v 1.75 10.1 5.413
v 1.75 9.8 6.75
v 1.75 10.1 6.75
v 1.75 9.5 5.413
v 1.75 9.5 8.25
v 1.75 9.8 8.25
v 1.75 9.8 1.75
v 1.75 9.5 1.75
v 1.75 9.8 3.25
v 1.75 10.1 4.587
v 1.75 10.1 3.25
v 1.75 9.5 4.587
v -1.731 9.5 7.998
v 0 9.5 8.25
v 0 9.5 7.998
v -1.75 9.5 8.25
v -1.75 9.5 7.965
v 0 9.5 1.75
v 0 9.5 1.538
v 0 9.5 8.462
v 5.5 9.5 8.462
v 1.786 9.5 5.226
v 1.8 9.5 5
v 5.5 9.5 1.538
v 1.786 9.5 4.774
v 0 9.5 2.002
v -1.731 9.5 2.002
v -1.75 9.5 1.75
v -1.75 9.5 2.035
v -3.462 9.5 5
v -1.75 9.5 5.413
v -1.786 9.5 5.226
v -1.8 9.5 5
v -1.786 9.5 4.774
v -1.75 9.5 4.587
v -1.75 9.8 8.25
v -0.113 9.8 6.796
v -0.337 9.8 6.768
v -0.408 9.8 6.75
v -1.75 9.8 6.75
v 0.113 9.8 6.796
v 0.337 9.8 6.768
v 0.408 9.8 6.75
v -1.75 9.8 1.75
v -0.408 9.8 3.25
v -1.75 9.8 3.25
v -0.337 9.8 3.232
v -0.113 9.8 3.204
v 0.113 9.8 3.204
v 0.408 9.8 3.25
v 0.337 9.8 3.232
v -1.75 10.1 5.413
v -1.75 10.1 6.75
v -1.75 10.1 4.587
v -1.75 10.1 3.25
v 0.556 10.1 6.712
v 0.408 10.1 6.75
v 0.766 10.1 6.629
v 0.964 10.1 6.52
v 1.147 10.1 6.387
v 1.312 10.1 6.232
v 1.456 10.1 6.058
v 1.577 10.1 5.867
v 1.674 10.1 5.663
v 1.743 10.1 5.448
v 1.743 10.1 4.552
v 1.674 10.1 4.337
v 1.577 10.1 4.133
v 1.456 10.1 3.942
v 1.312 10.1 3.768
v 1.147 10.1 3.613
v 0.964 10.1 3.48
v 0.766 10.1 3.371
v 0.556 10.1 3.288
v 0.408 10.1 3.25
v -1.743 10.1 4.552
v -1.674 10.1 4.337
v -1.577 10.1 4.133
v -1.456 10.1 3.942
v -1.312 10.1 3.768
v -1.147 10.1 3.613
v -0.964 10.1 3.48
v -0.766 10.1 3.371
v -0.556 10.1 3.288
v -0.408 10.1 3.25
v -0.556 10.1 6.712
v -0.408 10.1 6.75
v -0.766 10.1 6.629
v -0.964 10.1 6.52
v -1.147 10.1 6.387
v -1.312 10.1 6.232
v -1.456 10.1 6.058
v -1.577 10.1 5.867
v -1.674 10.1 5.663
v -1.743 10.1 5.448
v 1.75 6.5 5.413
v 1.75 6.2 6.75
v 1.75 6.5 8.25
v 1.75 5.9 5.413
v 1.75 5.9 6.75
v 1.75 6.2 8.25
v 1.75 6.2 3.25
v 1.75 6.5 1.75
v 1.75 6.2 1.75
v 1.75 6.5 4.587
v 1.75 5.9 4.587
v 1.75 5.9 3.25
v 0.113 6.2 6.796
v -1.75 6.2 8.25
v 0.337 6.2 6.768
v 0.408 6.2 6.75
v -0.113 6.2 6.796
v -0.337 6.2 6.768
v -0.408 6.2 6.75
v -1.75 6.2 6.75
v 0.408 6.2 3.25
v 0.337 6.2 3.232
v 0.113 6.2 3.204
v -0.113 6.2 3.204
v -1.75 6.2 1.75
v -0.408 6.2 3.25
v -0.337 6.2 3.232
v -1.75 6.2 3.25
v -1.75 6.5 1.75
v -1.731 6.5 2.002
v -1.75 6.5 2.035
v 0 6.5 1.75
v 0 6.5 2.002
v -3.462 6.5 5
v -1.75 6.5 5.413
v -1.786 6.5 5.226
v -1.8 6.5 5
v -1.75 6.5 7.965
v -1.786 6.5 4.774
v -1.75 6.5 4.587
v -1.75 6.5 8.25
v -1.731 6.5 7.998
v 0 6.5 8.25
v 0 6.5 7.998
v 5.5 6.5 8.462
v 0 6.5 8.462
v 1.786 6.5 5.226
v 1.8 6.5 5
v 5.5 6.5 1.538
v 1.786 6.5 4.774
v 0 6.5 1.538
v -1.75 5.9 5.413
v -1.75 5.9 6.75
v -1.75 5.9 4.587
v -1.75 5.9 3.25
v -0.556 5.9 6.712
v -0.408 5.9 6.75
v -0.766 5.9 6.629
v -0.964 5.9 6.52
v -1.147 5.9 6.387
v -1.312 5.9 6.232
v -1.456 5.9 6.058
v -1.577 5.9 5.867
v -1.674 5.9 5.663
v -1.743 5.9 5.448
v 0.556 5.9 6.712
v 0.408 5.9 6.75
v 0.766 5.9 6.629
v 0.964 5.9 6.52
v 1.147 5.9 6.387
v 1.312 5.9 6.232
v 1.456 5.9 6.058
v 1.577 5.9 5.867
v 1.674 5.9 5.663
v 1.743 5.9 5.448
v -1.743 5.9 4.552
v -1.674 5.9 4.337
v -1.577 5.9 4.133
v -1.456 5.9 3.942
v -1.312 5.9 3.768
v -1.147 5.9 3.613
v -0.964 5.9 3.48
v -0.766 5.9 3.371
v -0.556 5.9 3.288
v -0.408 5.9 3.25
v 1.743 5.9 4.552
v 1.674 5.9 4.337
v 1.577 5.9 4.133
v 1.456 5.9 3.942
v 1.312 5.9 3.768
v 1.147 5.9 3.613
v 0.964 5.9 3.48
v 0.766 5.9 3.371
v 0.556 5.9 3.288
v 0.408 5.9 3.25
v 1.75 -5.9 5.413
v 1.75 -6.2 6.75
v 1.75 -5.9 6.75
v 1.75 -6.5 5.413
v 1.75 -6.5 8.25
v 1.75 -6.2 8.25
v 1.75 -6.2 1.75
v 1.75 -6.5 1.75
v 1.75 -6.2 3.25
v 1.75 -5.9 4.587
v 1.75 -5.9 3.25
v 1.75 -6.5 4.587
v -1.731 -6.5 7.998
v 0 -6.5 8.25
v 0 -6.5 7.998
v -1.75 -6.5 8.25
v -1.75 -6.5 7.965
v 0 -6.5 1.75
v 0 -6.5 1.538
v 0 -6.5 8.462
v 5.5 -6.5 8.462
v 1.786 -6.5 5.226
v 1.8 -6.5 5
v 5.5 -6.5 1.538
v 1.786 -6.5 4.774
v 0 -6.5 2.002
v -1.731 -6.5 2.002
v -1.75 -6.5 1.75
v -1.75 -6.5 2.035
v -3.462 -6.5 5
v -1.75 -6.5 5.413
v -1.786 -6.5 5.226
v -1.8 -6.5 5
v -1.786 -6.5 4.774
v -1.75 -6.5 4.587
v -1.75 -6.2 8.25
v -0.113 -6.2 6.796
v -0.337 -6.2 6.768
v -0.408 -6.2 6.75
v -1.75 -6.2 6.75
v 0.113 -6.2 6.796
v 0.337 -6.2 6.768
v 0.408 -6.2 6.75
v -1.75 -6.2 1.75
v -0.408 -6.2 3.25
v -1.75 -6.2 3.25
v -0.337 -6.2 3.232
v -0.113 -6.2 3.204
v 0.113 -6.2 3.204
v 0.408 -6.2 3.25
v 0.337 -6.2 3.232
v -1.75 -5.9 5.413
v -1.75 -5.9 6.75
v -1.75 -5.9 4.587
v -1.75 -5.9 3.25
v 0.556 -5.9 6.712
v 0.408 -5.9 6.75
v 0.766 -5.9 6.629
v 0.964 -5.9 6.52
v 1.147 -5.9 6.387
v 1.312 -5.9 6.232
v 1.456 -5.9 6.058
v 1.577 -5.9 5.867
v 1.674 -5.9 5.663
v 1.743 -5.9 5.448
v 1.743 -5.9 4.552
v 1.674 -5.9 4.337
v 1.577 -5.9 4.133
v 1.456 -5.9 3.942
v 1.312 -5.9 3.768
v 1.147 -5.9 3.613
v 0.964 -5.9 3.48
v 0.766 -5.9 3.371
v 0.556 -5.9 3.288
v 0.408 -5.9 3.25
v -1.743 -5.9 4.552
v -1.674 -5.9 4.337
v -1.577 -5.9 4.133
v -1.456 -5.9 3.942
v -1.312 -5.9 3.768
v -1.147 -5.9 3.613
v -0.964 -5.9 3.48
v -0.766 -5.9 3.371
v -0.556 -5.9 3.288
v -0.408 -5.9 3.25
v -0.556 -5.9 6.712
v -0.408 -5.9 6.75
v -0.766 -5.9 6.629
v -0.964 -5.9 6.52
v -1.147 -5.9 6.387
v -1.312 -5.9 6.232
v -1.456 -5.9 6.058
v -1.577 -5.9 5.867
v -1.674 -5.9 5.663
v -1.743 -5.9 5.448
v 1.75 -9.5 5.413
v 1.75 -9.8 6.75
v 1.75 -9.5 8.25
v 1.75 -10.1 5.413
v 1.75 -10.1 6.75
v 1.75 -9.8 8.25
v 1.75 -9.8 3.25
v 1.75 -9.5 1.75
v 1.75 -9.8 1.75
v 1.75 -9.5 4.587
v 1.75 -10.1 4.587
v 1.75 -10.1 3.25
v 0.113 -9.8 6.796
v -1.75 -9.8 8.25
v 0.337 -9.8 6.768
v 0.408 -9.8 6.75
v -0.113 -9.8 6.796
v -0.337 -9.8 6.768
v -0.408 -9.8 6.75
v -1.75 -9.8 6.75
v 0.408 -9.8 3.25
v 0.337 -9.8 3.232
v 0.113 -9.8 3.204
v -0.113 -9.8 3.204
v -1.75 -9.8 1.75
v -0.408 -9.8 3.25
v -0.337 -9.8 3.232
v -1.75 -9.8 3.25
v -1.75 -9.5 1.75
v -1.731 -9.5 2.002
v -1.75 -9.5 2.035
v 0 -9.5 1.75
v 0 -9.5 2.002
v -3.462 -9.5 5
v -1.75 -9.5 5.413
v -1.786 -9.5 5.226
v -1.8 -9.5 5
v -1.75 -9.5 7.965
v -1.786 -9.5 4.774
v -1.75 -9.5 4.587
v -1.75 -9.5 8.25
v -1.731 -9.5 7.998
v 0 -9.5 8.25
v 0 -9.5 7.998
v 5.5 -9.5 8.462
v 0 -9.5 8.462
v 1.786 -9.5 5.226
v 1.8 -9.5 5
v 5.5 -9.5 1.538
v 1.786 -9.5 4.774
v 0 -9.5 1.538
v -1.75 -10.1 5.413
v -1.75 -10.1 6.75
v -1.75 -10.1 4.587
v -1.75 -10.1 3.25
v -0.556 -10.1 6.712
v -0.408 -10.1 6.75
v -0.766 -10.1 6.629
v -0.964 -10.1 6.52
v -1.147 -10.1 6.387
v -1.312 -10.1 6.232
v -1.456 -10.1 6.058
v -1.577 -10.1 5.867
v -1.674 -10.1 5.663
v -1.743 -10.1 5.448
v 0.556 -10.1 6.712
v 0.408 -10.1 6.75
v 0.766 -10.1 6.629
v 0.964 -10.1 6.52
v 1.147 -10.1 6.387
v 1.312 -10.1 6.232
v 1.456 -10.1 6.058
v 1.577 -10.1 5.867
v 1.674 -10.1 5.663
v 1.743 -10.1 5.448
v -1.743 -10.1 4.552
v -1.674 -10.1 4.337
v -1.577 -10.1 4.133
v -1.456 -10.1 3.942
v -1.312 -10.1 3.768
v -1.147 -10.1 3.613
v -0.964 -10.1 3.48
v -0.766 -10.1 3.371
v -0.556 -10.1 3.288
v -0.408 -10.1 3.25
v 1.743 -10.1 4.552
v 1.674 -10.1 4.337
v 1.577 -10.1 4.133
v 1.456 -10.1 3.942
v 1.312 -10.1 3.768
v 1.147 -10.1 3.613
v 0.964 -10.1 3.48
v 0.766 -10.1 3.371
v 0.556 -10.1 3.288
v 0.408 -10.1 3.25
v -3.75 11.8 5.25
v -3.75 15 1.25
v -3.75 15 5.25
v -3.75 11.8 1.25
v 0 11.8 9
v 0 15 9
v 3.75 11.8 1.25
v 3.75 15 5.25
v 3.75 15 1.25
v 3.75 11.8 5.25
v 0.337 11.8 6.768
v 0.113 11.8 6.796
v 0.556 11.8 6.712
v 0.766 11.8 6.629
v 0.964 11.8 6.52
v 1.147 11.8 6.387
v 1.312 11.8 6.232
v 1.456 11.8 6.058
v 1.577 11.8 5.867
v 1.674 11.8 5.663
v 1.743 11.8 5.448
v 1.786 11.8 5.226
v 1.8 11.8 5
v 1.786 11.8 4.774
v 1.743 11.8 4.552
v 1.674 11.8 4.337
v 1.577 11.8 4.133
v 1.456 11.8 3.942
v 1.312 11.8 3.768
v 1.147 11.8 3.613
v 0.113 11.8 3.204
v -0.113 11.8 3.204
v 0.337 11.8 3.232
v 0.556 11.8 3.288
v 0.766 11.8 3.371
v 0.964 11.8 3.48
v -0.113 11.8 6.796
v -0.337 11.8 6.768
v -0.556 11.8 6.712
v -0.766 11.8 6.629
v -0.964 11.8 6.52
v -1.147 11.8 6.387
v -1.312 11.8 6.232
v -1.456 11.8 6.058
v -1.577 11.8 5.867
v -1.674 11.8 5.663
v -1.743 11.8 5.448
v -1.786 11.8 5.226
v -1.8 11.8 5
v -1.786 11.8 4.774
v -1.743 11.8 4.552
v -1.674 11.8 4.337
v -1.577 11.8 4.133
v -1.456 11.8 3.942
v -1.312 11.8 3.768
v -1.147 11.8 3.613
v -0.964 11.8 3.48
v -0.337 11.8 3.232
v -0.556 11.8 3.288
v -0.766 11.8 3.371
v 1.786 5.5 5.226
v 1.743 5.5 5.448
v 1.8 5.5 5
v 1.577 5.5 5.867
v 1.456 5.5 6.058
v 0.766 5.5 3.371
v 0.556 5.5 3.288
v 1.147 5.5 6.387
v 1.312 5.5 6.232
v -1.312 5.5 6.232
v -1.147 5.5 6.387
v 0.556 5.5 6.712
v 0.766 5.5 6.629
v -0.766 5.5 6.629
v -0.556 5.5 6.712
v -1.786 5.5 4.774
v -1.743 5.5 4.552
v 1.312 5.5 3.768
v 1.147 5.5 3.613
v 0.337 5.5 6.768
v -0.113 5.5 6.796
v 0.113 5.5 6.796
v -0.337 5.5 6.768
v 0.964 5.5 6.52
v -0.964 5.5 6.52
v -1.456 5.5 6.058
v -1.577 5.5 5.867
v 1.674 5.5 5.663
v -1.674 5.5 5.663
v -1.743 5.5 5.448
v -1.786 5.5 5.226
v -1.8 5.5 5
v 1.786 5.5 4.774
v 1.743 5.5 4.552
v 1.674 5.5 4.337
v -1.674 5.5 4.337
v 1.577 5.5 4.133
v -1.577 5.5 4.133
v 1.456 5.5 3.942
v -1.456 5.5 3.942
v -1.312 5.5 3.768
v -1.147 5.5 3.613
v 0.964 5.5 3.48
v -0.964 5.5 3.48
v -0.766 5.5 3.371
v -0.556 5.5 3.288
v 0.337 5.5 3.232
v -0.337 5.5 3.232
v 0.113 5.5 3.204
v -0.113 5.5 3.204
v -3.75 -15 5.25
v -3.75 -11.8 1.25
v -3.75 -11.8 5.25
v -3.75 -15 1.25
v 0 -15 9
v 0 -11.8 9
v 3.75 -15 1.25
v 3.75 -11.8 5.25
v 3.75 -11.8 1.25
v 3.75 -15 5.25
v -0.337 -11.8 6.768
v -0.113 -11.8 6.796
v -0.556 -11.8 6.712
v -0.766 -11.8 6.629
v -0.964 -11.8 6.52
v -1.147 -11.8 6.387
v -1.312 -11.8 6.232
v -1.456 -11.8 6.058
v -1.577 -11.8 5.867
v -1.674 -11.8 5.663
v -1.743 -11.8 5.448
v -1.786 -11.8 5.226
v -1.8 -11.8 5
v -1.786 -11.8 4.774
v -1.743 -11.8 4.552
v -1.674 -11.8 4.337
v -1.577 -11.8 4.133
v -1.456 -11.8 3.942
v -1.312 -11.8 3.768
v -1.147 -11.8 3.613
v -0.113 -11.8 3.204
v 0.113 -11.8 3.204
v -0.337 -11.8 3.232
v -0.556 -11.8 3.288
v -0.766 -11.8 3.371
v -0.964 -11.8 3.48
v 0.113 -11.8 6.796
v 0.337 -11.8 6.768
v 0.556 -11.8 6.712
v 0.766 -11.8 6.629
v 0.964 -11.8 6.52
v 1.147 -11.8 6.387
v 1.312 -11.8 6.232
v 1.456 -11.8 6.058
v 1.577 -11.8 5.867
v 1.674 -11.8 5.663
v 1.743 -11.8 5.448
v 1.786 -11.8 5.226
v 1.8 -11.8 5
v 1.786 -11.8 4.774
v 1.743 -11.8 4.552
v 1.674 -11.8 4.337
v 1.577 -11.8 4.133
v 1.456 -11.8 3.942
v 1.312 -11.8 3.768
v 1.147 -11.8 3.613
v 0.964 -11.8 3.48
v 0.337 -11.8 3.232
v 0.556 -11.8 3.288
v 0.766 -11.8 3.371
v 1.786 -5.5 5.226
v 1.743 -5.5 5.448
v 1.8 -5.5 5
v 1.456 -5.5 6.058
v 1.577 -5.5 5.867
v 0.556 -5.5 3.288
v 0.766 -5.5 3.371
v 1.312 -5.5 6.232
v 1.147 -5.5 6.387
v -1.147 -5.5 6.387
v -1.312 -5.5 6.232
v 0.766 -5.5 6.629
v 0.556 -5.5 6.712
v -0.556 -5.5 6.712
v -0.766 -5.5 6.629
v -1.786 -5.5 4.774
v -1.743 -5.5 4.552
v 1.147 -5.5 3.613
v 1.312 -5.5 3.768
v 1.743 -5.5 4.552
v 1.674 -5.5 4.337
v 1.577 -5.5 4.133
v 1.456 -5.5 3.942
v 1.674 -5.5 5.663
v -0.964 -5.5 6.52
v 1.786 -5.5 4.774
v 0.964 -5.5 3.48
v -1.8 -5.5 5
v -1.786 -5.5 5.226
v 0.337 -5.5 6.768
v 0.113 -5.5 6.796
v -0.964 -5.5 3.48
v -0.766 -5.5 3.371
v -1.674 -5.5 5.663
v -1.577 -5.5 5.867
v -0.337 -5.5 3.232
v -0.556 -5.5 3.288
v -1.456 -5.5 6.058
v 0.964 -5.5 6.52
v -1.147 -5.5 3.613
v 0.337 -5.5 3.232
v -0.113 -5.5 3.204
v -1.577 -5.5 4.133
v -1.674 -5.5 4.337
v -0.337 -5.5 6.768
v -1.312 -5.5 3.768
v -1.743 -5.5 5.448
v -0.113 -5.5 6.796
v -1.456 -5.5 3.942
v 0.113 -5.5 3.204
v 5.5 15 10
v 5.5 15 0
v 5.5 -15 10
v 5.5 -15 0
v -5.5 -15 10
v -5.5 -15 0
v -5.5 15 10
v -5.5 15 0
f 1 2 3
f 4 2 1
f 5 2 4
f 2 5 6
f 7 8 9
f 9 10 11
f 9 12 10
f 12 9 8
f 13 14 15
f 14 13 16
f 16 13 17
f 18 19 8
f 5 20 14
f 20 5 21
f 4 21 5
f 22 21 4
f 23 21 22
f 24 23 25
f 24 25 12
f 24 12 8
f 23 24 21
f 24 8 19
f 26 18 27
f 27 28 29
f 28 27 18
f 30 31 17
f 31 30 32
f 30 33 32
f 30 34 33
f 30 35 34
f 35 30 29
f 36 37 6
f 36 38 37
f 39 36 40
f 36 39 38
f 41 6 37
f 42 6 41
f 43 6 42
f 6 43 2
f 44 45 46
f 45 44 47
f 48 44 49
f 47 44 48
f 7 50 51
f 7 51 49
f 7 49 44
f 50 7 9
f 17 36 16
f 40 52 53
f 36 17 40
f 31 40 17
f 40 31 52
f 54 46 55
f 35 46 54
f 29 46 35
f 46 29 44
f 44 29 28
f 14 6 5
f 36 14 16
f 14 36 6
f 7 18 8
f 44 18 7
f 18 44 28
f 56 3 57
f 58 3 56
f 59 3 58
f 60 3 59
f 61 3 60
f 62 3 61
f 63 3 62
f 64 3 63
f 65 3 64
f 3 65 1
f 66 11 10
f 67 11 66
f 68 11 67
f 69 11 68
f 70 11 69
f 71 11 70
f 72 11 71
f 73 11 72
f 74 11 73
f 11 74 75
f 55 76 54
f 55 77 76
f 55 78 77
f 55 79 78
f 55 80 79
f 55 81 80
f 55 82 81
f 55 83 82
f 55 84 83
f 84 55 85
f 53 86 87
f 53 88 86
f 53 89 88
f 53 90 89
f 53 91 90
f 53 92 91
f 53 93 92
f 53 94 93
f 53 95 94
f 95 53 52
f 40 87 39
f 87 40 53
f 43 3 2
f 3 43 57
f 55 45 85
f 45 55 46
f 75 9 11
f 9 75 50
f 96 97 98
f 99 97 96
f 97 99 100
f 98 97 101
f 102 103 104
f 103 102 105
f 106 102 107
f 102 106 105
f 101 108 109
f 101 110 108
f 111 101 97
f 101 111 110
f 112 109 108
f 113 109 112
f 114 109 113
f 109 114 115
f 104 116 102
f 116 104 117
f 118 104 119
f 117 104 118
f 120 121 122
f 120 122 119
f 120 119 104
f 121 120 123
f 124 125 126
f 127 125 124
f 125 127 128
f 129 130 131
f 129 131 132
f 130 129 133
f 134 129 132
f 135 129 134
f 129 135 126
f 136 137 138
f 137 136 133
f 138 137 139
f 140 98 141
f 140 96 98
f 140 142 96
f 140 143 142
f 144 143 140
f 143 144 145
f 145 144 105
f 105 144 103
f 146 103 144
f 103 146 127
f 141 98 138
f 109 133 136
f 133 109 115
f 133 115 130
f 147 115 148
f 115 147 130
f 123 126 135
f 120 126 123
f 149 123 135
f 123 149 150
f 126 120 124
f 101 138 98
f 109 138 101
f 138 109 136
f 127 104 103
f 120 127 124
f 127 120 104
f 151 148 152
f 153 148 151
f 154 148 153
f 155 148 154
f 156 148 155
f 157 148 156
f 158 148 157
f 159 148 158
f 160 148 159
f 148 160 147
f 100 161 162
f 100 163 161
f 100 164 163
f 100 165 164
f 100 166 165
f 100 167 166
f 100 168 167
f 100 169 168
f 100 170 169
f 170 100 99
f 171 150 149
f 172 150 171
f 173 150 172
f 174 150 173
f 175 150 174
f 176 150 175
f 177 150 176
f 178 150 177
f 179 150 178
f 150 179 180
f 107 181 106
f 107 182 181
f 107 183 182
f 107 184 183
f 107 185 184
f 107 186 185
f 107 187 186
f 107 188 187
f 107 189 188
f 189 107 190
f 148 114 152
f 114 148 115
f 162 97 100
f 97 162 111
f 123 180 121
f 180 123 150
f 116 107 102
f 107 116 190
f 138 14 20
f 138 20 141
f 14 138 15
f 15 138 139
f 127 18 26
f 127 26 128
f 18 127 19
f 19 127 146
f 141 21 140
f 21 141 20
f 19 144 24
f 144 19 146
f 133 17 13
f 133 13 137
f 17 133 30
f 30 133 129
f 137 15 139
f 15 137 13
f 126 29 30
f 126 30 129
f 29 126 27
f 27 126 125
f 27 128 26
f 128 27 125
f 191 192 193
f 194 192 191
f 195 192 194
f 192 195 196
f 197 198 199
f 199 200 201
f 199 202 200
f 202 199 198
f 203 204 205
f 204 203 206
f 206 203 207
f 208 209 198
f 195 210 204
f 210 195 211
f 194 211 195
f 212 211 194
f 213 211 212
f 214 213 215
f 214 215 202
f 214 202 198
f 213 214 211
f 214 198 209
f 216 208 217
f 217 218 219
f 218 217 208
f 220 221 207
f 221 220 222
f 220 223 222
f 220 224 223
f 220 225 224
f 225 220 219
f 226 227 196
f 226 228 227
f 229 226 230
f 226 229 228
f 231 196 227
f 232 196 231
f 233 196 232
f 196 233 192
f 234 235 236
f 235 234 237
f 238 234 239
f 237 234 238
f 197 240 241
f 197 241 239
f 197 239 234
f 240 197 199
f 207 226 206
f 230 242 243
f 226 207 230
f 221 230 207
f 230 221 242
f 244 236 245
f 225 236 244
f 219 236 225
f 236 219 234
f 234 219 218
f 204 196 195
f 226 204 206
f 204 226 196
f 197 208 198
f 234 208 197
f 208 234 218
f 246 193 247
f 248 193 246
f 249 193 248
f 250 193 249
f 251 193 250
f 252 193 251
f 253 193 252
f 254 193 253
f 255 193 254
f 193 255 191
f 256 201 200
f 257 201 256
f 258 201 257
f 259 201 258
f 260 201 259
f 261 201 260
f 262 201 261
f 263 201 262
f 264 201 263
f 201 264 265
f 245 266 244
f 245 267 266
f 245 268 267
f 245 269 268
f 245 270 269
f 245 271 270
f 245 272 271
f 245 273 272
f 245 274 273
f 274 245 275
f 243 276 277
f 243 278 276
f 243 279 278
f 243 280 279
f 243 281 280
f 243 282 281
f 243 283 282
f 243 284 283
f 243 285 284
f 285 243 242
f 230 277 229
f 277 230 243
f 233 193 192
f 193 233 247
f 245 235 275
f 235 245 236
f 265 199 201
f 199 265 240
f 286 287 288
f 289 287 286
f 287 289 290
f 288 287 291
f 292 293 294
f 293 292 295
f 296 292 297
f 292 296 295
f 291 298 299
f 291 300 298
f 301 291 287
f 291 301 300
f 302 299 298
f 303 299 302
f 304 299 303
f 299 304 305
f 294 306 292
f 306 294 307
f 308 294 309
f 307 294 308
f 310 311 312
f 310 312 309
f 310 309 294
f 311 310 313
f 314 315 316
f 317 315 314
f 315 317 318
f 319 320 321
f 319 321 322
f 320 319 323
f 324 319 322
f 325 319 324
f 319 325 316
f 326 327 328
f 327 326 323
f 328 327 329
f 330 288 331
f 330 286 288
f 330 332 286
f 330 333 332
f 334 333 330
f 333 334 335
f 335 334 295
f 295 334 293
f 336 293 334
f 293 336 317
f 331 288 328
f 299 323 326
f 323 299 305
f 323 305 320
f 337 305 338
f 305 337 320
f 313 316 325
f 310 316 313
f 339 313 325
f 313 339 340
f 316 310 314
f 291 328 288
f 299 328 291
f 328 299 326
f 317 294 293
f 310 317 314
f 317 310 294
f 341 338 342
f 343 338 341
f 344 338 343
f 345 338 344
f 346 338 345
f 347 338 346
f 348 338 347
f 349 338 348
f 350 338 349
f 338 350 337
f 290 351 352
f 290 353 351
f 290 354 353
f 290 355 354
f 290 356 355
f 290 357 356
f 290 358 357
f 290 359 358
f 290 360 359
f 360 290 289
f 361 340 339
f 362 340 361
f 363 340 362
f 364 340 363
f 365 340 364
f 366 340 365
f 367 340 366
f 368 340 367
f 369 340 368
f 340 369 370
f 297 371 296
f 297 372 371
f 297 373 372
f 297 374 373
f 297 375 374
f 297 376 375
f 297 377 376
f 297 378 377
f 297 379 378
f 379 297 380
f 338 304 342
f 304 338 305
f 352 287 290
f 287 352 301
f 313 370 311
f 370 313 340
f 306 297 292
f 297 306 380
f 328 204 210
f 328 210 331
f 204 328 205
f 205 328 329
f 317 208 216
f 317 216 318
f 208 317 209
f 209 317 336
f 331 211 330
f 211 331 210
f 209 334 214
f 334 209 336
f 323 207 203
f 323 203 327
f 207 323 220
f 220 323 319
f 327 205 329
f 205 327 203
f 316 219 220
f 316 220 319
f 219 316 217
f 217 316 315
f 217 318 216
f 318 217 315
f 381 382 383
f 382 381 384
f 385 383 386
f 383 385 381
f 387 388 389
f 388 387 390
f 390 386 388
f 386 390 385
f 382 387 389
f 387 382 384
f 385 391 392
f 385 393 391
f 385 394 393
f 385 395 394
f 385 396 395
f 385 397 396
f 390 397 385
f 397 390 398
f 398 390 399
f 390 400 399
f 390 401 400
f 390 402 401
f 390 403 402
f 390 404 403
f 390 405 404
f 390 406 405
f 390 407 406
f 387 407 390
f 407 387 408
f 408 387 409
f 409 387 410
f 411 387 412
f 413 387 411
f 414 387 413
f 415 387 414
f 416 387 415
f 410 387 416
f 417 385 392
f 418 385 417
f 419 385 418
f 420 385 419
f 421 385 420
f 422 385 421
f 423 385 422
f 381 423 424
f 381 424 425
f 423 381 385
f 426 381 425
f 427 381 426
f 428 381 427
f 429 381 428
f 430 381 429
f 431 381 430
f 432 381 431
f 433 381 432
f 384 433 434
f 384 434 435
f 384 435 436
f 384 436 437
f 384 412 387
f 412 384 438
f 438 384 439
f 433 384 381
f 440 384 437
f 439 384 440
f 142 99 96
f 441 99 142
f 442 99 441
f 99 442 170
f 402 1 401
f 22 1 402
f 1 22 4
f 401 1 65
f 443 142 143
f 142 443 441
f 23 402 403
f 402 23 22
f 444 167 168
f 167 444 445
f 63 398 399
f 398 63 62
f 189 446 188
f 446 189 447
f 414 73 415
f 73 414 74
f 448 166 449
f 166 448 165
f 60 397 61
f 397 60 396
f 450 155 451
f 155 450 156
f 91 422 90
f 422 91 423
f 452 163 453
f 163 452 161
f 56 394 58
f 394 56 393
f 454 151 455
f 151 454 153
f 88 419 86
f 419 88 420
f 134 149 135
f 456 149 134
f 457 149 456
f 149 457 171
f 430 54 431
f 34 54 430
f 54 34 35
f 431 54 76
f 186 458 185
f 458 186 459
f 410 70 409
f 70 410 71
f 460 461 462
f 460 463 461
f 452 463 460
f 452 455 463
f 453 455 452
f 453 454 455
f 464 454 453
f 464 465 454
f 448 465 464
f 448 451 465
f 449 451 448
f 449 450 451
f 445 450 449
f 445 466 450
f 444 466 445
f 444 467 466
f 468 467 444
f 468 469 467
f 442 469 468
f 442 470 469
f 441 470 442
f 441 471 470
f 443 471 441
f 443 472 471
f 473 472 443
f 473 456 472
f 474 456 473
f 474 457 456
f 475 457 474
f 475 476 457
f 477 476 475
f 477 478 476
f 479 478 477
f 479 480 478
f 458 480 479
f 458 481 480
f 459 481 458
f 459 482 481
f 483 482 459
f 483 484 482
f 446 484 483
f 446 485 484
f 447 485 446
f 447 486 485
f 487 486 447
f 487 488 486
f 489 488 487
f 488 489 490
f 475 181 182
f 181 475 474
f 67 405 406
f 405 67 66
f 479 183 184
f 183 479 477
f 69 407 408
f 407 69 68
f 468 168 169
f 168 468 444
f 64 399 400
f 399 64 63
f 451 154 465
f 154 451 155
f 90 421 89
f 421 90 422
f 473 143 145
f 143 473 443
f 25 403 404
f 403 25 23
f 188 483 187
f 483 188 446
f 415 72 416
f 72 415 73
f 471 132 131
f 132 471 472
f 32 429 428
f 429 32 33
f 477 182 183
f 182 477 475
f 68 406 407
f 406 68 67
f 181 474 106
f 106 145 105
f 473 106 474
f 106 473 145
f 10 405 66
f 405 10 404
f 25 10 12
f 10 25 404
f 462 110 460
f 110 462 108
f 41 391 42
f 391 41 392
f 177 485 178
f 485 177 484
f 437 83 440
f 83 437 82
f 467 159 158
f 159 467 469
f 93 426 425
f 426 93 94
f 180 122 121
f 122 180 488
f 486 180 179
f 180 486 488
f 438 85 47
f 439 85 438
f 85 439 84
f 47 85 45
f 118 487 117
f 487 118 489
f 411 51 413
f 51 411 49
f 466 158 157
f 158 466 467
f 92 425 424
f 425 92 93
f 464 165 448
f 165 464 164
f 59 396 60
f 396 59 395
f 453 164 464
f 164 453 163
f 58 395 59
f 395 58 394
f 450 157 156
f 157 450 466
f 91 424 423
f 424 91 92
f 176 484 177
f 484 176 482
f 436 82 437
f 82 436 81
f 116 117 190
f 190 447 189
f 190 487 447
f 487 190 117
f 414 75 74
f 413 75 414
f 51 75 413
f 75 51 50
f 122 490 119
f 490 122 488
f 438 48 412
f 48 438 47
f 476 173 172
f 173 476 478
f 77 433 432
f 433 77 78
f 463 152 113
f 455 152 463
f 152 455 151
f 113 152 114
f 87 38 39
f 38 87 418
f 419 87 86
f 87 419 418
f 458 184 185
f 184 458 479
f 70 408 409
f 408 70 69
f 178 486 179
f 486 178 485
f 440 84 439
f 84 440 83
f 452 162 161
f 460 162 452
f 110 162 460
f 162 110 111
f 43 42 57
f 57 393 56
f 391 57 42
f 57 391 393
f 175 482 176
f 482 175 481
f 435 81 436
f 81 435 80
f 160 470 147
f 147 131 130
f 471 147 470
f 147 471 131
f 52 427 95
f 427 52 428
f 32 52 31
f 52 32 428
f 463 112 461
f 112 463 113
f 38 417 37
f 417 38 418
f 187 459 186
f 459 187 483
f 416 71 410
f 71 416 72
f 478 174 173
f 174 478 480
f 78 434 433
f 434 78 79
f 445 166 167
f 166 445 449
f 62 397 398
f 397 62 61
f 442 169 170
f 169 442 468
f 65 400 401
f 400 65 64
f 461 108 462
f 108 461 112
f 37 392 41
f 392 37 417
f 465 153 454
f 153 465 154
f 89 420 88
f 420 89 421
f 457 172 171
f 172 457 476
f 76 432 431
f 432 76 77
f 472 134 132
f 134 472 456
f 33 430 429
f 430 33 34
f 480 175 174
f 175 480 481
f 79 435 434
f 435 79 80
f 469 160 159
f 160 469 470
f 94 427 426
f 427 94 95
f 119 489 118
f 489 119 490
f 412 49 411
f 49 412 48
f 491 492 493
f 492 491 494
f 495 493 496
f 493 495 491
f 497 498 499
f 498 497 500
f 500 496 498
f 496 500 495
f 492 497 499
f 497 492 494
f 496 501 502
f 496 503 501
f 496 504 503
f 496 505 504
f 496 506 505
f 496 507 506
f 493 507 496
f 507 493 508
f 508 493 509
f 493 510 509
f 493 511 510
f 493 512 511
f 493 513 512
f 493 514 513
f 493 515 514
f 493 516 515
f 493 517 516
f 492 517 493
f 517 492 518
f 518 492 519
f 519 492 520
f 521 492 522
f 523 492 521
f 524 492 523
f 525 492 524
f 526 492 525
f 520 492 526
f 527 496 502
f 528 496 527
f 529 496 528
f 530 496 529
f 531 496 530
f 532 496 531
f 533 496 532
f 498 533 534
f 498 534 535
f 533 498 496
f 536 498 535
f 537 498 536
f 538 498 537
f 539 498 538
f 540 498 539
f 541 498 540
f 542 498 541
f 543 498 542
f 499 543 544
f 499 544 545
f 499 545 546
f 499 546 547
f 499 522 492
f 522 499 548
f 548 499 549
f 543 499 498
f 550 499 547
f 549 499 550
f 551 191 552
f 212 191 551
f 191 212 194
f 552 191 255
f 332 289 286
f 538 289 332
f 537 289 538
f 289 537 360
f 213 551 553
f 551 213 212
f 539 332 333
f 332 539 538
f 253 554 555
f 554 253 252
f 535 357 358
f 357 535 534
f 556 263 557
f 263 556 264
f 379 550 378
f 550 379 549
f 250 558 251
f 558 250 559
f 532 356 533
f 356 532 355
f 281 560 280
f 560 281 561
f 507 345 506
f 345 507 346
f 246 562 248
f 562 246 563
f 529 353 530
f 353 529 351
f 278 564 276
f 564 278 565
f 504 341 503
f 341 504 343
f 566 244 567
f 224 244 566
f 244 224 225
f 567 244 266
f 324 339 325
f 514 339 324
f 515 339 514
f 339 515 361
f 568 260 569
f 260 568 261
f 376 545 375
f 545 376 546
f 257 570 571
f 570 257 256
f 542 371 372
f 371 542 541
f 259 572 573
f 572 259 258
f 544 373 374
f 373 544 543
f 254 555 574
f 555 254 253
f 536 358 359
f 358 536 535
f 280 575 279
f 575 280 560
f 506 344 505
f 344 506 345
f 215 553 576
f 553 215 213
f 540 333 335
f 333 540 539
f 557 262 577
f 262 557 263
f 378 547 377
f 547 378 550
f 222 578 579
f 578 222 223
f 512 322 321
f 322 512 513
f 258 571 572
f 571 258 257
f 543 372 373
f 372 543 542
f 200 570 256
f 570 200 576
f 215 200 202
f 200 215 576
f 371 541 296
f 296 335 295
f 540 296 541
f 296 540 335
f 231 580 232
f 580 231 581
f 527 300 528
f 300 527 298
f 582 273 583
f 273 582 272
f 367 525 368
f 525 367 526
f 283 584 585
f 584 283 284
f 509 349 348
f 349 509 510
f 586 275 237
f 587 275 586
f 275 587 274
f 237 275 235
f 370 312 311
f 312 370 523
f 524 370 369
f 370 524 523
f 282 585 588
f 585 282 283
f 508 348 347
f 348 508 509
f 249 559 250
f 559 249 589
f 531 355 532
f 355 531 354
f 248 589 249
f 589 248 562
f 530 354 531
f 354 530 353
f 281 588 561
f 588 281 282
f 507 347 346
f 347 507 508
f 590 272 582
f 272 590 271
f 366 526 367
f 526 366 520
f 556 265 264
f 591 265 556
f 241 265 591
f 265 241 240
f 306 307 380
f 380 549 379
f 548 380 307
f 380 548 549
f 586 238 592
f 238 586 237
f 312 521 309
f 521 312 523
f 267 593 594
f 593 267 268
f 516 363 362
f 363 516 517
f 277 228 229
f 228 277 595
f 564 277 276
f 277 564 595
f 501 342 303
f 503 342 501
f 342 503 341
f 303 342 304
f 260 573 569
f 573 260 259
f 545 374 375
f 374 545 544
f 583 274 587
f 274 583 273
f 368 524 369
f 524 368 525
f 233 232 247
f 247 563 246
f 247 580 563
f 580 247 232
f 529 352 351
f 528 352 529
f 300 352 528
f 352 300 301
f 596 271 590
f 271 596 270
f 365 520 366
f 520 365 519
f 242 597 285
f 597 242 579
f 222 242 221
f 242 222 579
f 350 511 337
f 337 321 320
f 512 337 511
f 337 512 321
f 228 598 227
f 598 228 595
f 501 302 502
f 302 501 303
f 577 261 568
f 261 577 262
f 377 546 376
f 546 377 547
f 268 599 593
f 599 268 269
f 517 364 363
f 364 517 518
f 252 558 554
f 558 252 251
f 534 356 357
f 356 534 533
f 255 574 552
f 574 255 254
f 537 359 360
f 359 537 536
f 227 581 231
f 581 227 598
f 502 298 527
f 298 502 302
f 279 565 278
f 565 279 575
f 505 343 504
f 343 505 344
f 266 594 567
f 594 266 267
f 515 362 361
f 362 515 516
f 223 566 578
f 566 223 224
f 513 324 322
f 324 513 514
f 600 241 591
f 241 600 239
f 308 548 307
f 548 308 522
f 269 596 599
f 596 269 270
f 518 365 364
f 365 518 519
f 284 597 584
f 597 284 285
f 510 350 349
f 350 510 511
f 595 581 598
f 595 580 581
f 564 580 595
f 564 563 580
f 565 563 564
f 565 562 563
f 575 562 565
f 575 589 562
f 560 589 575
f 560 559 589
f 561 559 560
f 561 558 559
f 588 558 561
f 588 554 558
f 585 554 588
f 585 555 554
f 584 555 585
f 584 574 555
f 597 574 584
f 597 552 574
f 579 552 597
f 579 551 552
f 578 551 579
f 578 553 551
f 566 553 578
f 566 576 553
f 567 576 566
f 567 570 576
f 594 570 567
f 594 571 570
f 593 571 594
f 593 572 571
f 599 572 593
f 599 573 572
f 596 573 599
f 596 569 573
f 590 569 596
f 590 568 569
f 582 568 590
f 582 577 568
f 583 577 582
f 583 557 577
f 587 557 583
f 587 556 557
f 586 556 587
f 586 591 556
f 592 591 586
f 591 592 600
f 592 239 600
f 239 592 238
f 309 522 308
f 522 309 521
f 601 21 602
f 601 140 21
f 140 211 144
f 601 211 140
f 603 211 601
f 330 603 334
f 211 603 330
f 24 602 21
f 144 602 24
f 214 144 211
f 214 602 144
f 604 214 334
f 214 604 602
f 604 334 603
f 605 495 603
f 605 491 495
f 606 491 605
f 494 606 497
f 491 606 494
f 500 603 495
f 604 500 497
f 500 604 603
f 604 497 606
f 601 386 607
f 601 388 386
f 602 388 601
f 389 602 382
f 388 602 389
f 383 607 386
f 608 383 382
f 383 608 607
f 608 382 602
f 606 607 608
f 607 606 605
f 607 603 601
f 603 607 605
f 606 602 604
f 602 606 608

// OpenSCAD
$fn = 50;

difference() {
	union() {
		translate(v = [0, 15.0, 0]) {
			rotate(a = [90, 0, 0]) {
				difference() {
					union() {
						translate(v = [-5.5, 0, 0]) {
							cube(size = [11.0, 10.0, 30.0]);
						}
					}
					union() {
						translate(v = [0, 5.0, 5.5]) {
							rotate(a = [0, 0, 0]) {
								difference() {
									union() {
										translate(v = [-1.75, -3.25, -0.3]) {
											cube(size = [3.5, 6.5, 0.3]);
										}
										translate(v = [-1.75, -1.75, -0.6]) {
											cube(size = [3.5, 3.5, 0.3]);
										}
										translate(v = [-1.75, -3.25, 3]) {
											cube(size = [3.5, 6.5, 0.3]);
										}
										translate(v = [-1.75, -1.75, 3.3]) {
											cube(size = [3.5, 3.5, 0.3]);
										}
										translate(v = [0.0, -3.4619999999999997, 0]) {
											cube(size = [20, 6.9239999999999995, 3]);
										}
										linear_extrude(height = 3) {
											polygon(points = [[3.4619999999999997, 0.0], [1.7310000000000003, 2.9981799479017264], [-1.7309999999999992, 2.9981799479017264], [-3.4619999999999997, 4.2397272186481365e-16], [-1.7310000000000014, -2.998179947901726], [1.7309999999999977, -2.9981799479017277]]);
										}
										translate(v = [-1.75, -3.25, -0.3]) {
											cube(size = [3.5, 6.5, 0.3]);
										}
										translate(v = [-1.75, -1.75, -0.6]) {
											cube(size = [3.5, 3.5, 0.3]);
										}
										translate(v = [-1.75, -3.25, 3]) {
											cube(size = [3.5, 6.5, 0.3]);
										}
										translate(v = [-1.75, -1.75, 3.3]) {
											cube(size = [3.5, 3.5, 0.3]);
										}
										translate(v = [-1.75, -3.25, -0.3]) {
											cube(size = [3.5, 6.5, 0.3]);
										}
										translate(v = [-1.75, -1.75, -0.6]) {
											cube(size = [3.5, 3.5, 0.3]);
										}
										translate(v = [-1.75, -3.25, 3]) {
											cube(size = [3.5, 6.5, 0.3]);
										}
										translate(v = [-1.75, -1.75, 3.3]) {
											cube(size = [3.5, 3.5, 0.3]);
										}
									}
									union();
								}
							}
						}
						translate(v = [0, 5.0, 21.5]) {
							rotate(a = [0, 0, 0]) {
								difference() {
									union() {
										translate(v = [-1.75, -3.25, -0.3]) {
											cube(size = [3.5, 6.5, 0.3]);
										}
										translate(v = [-1.75, -1.75, -0.6]) {
											cube(size = [3.5, 3.5, 0.3]);
										}
										translate(v = [-1.75, -3.25, 3]) {
											cube(size = [3.5, 6.5, 0.3]);
										}
										translate(v = [-1.75, -1.75, 3.3]) {
											cube(size = [3.5, 3.5, 0.3]);
										}
										translate(v = [0.0, -3.4619999999999997, 0]) {
											cube(size = [20, 6.9239999999999995, 3]);
										}
										linear_extrude(height = 3) {
											polygon(points = [[3.4619999999999997, 0.0], [1.7310000000000003, 2.9981799479017264], [-1.7309999999999992, 2.9981799479017264], [-3.4619999999999997, 4.2397272186481365e-16], [-1.7310000000000014, -2.998179947901726], [1.7309999999999977, -2.9981799479017277]]);
										}
										translate(v = [-1.75, -3.25, -0.3]) {
											cube(size = [3.5, 6.5, 0.3]);
										}
										translate(v = [-1.75, -1.75, -0.6]) {
											cube(size = [3.5, 3.5, 0.3]);
										}
										translate(v = [-1.75, -3.25, 3]) {
											cube(size = [3.5, 6.5, 0.3]);
										}
										translate(v = [-1.75, -1.75, 3.3]) {
											cube(size = [3.5, 3.5, 0.3]);
										}
										translate(v = [-1.75, -3.25, -0.3]) {
											cube(size = [3.5, 6.5, 0.3]);
										}
										translate(v = [-1.75, -1.75, -0.6]) {
											cube(size = [3.5, 3.5, 0.3]);
										}
										translate(v = [-1.75, -3.25, 3]) {
											cube(size = [3.5, 6.5, 0.3]);
										}
										translate(v = [-1.75, -1.75, 3.3]) {
											cube(size = [3.5, 3.5, 0.3]);
										}
									}
									union();
								}
							}
						}
						translate(v = [0, 0, -0.1]) {
							linear_extrude(height = 3.3000000000000003) {
								polygon(points = [[-3.75, 1.25], [3.75, 1.25], [3.75, 5.25], [0, 9.0], [-3.75, 5.25]]);
							}
						}
						translate(v = [0, 5.0, -0.1]) {
							cylinder(h = 9.6, r = 1.8);
						}
						translate(v = [0, 0, 26.8]) {
							linear_extrude(height = 3.3000000000000003) {
								polygon(points = [[-3.75, 1.25], [3.75, 1.25], [3.75, 5.25], [0, 9.0], [-3.75, 5.25]]);
							}
						}
						translate(v = [0, 5.0, 20.5]) {
							cylinder(h = 9.6, r = 1.8);
						}
					}
				}
			}
		}
	}
	union();
}
